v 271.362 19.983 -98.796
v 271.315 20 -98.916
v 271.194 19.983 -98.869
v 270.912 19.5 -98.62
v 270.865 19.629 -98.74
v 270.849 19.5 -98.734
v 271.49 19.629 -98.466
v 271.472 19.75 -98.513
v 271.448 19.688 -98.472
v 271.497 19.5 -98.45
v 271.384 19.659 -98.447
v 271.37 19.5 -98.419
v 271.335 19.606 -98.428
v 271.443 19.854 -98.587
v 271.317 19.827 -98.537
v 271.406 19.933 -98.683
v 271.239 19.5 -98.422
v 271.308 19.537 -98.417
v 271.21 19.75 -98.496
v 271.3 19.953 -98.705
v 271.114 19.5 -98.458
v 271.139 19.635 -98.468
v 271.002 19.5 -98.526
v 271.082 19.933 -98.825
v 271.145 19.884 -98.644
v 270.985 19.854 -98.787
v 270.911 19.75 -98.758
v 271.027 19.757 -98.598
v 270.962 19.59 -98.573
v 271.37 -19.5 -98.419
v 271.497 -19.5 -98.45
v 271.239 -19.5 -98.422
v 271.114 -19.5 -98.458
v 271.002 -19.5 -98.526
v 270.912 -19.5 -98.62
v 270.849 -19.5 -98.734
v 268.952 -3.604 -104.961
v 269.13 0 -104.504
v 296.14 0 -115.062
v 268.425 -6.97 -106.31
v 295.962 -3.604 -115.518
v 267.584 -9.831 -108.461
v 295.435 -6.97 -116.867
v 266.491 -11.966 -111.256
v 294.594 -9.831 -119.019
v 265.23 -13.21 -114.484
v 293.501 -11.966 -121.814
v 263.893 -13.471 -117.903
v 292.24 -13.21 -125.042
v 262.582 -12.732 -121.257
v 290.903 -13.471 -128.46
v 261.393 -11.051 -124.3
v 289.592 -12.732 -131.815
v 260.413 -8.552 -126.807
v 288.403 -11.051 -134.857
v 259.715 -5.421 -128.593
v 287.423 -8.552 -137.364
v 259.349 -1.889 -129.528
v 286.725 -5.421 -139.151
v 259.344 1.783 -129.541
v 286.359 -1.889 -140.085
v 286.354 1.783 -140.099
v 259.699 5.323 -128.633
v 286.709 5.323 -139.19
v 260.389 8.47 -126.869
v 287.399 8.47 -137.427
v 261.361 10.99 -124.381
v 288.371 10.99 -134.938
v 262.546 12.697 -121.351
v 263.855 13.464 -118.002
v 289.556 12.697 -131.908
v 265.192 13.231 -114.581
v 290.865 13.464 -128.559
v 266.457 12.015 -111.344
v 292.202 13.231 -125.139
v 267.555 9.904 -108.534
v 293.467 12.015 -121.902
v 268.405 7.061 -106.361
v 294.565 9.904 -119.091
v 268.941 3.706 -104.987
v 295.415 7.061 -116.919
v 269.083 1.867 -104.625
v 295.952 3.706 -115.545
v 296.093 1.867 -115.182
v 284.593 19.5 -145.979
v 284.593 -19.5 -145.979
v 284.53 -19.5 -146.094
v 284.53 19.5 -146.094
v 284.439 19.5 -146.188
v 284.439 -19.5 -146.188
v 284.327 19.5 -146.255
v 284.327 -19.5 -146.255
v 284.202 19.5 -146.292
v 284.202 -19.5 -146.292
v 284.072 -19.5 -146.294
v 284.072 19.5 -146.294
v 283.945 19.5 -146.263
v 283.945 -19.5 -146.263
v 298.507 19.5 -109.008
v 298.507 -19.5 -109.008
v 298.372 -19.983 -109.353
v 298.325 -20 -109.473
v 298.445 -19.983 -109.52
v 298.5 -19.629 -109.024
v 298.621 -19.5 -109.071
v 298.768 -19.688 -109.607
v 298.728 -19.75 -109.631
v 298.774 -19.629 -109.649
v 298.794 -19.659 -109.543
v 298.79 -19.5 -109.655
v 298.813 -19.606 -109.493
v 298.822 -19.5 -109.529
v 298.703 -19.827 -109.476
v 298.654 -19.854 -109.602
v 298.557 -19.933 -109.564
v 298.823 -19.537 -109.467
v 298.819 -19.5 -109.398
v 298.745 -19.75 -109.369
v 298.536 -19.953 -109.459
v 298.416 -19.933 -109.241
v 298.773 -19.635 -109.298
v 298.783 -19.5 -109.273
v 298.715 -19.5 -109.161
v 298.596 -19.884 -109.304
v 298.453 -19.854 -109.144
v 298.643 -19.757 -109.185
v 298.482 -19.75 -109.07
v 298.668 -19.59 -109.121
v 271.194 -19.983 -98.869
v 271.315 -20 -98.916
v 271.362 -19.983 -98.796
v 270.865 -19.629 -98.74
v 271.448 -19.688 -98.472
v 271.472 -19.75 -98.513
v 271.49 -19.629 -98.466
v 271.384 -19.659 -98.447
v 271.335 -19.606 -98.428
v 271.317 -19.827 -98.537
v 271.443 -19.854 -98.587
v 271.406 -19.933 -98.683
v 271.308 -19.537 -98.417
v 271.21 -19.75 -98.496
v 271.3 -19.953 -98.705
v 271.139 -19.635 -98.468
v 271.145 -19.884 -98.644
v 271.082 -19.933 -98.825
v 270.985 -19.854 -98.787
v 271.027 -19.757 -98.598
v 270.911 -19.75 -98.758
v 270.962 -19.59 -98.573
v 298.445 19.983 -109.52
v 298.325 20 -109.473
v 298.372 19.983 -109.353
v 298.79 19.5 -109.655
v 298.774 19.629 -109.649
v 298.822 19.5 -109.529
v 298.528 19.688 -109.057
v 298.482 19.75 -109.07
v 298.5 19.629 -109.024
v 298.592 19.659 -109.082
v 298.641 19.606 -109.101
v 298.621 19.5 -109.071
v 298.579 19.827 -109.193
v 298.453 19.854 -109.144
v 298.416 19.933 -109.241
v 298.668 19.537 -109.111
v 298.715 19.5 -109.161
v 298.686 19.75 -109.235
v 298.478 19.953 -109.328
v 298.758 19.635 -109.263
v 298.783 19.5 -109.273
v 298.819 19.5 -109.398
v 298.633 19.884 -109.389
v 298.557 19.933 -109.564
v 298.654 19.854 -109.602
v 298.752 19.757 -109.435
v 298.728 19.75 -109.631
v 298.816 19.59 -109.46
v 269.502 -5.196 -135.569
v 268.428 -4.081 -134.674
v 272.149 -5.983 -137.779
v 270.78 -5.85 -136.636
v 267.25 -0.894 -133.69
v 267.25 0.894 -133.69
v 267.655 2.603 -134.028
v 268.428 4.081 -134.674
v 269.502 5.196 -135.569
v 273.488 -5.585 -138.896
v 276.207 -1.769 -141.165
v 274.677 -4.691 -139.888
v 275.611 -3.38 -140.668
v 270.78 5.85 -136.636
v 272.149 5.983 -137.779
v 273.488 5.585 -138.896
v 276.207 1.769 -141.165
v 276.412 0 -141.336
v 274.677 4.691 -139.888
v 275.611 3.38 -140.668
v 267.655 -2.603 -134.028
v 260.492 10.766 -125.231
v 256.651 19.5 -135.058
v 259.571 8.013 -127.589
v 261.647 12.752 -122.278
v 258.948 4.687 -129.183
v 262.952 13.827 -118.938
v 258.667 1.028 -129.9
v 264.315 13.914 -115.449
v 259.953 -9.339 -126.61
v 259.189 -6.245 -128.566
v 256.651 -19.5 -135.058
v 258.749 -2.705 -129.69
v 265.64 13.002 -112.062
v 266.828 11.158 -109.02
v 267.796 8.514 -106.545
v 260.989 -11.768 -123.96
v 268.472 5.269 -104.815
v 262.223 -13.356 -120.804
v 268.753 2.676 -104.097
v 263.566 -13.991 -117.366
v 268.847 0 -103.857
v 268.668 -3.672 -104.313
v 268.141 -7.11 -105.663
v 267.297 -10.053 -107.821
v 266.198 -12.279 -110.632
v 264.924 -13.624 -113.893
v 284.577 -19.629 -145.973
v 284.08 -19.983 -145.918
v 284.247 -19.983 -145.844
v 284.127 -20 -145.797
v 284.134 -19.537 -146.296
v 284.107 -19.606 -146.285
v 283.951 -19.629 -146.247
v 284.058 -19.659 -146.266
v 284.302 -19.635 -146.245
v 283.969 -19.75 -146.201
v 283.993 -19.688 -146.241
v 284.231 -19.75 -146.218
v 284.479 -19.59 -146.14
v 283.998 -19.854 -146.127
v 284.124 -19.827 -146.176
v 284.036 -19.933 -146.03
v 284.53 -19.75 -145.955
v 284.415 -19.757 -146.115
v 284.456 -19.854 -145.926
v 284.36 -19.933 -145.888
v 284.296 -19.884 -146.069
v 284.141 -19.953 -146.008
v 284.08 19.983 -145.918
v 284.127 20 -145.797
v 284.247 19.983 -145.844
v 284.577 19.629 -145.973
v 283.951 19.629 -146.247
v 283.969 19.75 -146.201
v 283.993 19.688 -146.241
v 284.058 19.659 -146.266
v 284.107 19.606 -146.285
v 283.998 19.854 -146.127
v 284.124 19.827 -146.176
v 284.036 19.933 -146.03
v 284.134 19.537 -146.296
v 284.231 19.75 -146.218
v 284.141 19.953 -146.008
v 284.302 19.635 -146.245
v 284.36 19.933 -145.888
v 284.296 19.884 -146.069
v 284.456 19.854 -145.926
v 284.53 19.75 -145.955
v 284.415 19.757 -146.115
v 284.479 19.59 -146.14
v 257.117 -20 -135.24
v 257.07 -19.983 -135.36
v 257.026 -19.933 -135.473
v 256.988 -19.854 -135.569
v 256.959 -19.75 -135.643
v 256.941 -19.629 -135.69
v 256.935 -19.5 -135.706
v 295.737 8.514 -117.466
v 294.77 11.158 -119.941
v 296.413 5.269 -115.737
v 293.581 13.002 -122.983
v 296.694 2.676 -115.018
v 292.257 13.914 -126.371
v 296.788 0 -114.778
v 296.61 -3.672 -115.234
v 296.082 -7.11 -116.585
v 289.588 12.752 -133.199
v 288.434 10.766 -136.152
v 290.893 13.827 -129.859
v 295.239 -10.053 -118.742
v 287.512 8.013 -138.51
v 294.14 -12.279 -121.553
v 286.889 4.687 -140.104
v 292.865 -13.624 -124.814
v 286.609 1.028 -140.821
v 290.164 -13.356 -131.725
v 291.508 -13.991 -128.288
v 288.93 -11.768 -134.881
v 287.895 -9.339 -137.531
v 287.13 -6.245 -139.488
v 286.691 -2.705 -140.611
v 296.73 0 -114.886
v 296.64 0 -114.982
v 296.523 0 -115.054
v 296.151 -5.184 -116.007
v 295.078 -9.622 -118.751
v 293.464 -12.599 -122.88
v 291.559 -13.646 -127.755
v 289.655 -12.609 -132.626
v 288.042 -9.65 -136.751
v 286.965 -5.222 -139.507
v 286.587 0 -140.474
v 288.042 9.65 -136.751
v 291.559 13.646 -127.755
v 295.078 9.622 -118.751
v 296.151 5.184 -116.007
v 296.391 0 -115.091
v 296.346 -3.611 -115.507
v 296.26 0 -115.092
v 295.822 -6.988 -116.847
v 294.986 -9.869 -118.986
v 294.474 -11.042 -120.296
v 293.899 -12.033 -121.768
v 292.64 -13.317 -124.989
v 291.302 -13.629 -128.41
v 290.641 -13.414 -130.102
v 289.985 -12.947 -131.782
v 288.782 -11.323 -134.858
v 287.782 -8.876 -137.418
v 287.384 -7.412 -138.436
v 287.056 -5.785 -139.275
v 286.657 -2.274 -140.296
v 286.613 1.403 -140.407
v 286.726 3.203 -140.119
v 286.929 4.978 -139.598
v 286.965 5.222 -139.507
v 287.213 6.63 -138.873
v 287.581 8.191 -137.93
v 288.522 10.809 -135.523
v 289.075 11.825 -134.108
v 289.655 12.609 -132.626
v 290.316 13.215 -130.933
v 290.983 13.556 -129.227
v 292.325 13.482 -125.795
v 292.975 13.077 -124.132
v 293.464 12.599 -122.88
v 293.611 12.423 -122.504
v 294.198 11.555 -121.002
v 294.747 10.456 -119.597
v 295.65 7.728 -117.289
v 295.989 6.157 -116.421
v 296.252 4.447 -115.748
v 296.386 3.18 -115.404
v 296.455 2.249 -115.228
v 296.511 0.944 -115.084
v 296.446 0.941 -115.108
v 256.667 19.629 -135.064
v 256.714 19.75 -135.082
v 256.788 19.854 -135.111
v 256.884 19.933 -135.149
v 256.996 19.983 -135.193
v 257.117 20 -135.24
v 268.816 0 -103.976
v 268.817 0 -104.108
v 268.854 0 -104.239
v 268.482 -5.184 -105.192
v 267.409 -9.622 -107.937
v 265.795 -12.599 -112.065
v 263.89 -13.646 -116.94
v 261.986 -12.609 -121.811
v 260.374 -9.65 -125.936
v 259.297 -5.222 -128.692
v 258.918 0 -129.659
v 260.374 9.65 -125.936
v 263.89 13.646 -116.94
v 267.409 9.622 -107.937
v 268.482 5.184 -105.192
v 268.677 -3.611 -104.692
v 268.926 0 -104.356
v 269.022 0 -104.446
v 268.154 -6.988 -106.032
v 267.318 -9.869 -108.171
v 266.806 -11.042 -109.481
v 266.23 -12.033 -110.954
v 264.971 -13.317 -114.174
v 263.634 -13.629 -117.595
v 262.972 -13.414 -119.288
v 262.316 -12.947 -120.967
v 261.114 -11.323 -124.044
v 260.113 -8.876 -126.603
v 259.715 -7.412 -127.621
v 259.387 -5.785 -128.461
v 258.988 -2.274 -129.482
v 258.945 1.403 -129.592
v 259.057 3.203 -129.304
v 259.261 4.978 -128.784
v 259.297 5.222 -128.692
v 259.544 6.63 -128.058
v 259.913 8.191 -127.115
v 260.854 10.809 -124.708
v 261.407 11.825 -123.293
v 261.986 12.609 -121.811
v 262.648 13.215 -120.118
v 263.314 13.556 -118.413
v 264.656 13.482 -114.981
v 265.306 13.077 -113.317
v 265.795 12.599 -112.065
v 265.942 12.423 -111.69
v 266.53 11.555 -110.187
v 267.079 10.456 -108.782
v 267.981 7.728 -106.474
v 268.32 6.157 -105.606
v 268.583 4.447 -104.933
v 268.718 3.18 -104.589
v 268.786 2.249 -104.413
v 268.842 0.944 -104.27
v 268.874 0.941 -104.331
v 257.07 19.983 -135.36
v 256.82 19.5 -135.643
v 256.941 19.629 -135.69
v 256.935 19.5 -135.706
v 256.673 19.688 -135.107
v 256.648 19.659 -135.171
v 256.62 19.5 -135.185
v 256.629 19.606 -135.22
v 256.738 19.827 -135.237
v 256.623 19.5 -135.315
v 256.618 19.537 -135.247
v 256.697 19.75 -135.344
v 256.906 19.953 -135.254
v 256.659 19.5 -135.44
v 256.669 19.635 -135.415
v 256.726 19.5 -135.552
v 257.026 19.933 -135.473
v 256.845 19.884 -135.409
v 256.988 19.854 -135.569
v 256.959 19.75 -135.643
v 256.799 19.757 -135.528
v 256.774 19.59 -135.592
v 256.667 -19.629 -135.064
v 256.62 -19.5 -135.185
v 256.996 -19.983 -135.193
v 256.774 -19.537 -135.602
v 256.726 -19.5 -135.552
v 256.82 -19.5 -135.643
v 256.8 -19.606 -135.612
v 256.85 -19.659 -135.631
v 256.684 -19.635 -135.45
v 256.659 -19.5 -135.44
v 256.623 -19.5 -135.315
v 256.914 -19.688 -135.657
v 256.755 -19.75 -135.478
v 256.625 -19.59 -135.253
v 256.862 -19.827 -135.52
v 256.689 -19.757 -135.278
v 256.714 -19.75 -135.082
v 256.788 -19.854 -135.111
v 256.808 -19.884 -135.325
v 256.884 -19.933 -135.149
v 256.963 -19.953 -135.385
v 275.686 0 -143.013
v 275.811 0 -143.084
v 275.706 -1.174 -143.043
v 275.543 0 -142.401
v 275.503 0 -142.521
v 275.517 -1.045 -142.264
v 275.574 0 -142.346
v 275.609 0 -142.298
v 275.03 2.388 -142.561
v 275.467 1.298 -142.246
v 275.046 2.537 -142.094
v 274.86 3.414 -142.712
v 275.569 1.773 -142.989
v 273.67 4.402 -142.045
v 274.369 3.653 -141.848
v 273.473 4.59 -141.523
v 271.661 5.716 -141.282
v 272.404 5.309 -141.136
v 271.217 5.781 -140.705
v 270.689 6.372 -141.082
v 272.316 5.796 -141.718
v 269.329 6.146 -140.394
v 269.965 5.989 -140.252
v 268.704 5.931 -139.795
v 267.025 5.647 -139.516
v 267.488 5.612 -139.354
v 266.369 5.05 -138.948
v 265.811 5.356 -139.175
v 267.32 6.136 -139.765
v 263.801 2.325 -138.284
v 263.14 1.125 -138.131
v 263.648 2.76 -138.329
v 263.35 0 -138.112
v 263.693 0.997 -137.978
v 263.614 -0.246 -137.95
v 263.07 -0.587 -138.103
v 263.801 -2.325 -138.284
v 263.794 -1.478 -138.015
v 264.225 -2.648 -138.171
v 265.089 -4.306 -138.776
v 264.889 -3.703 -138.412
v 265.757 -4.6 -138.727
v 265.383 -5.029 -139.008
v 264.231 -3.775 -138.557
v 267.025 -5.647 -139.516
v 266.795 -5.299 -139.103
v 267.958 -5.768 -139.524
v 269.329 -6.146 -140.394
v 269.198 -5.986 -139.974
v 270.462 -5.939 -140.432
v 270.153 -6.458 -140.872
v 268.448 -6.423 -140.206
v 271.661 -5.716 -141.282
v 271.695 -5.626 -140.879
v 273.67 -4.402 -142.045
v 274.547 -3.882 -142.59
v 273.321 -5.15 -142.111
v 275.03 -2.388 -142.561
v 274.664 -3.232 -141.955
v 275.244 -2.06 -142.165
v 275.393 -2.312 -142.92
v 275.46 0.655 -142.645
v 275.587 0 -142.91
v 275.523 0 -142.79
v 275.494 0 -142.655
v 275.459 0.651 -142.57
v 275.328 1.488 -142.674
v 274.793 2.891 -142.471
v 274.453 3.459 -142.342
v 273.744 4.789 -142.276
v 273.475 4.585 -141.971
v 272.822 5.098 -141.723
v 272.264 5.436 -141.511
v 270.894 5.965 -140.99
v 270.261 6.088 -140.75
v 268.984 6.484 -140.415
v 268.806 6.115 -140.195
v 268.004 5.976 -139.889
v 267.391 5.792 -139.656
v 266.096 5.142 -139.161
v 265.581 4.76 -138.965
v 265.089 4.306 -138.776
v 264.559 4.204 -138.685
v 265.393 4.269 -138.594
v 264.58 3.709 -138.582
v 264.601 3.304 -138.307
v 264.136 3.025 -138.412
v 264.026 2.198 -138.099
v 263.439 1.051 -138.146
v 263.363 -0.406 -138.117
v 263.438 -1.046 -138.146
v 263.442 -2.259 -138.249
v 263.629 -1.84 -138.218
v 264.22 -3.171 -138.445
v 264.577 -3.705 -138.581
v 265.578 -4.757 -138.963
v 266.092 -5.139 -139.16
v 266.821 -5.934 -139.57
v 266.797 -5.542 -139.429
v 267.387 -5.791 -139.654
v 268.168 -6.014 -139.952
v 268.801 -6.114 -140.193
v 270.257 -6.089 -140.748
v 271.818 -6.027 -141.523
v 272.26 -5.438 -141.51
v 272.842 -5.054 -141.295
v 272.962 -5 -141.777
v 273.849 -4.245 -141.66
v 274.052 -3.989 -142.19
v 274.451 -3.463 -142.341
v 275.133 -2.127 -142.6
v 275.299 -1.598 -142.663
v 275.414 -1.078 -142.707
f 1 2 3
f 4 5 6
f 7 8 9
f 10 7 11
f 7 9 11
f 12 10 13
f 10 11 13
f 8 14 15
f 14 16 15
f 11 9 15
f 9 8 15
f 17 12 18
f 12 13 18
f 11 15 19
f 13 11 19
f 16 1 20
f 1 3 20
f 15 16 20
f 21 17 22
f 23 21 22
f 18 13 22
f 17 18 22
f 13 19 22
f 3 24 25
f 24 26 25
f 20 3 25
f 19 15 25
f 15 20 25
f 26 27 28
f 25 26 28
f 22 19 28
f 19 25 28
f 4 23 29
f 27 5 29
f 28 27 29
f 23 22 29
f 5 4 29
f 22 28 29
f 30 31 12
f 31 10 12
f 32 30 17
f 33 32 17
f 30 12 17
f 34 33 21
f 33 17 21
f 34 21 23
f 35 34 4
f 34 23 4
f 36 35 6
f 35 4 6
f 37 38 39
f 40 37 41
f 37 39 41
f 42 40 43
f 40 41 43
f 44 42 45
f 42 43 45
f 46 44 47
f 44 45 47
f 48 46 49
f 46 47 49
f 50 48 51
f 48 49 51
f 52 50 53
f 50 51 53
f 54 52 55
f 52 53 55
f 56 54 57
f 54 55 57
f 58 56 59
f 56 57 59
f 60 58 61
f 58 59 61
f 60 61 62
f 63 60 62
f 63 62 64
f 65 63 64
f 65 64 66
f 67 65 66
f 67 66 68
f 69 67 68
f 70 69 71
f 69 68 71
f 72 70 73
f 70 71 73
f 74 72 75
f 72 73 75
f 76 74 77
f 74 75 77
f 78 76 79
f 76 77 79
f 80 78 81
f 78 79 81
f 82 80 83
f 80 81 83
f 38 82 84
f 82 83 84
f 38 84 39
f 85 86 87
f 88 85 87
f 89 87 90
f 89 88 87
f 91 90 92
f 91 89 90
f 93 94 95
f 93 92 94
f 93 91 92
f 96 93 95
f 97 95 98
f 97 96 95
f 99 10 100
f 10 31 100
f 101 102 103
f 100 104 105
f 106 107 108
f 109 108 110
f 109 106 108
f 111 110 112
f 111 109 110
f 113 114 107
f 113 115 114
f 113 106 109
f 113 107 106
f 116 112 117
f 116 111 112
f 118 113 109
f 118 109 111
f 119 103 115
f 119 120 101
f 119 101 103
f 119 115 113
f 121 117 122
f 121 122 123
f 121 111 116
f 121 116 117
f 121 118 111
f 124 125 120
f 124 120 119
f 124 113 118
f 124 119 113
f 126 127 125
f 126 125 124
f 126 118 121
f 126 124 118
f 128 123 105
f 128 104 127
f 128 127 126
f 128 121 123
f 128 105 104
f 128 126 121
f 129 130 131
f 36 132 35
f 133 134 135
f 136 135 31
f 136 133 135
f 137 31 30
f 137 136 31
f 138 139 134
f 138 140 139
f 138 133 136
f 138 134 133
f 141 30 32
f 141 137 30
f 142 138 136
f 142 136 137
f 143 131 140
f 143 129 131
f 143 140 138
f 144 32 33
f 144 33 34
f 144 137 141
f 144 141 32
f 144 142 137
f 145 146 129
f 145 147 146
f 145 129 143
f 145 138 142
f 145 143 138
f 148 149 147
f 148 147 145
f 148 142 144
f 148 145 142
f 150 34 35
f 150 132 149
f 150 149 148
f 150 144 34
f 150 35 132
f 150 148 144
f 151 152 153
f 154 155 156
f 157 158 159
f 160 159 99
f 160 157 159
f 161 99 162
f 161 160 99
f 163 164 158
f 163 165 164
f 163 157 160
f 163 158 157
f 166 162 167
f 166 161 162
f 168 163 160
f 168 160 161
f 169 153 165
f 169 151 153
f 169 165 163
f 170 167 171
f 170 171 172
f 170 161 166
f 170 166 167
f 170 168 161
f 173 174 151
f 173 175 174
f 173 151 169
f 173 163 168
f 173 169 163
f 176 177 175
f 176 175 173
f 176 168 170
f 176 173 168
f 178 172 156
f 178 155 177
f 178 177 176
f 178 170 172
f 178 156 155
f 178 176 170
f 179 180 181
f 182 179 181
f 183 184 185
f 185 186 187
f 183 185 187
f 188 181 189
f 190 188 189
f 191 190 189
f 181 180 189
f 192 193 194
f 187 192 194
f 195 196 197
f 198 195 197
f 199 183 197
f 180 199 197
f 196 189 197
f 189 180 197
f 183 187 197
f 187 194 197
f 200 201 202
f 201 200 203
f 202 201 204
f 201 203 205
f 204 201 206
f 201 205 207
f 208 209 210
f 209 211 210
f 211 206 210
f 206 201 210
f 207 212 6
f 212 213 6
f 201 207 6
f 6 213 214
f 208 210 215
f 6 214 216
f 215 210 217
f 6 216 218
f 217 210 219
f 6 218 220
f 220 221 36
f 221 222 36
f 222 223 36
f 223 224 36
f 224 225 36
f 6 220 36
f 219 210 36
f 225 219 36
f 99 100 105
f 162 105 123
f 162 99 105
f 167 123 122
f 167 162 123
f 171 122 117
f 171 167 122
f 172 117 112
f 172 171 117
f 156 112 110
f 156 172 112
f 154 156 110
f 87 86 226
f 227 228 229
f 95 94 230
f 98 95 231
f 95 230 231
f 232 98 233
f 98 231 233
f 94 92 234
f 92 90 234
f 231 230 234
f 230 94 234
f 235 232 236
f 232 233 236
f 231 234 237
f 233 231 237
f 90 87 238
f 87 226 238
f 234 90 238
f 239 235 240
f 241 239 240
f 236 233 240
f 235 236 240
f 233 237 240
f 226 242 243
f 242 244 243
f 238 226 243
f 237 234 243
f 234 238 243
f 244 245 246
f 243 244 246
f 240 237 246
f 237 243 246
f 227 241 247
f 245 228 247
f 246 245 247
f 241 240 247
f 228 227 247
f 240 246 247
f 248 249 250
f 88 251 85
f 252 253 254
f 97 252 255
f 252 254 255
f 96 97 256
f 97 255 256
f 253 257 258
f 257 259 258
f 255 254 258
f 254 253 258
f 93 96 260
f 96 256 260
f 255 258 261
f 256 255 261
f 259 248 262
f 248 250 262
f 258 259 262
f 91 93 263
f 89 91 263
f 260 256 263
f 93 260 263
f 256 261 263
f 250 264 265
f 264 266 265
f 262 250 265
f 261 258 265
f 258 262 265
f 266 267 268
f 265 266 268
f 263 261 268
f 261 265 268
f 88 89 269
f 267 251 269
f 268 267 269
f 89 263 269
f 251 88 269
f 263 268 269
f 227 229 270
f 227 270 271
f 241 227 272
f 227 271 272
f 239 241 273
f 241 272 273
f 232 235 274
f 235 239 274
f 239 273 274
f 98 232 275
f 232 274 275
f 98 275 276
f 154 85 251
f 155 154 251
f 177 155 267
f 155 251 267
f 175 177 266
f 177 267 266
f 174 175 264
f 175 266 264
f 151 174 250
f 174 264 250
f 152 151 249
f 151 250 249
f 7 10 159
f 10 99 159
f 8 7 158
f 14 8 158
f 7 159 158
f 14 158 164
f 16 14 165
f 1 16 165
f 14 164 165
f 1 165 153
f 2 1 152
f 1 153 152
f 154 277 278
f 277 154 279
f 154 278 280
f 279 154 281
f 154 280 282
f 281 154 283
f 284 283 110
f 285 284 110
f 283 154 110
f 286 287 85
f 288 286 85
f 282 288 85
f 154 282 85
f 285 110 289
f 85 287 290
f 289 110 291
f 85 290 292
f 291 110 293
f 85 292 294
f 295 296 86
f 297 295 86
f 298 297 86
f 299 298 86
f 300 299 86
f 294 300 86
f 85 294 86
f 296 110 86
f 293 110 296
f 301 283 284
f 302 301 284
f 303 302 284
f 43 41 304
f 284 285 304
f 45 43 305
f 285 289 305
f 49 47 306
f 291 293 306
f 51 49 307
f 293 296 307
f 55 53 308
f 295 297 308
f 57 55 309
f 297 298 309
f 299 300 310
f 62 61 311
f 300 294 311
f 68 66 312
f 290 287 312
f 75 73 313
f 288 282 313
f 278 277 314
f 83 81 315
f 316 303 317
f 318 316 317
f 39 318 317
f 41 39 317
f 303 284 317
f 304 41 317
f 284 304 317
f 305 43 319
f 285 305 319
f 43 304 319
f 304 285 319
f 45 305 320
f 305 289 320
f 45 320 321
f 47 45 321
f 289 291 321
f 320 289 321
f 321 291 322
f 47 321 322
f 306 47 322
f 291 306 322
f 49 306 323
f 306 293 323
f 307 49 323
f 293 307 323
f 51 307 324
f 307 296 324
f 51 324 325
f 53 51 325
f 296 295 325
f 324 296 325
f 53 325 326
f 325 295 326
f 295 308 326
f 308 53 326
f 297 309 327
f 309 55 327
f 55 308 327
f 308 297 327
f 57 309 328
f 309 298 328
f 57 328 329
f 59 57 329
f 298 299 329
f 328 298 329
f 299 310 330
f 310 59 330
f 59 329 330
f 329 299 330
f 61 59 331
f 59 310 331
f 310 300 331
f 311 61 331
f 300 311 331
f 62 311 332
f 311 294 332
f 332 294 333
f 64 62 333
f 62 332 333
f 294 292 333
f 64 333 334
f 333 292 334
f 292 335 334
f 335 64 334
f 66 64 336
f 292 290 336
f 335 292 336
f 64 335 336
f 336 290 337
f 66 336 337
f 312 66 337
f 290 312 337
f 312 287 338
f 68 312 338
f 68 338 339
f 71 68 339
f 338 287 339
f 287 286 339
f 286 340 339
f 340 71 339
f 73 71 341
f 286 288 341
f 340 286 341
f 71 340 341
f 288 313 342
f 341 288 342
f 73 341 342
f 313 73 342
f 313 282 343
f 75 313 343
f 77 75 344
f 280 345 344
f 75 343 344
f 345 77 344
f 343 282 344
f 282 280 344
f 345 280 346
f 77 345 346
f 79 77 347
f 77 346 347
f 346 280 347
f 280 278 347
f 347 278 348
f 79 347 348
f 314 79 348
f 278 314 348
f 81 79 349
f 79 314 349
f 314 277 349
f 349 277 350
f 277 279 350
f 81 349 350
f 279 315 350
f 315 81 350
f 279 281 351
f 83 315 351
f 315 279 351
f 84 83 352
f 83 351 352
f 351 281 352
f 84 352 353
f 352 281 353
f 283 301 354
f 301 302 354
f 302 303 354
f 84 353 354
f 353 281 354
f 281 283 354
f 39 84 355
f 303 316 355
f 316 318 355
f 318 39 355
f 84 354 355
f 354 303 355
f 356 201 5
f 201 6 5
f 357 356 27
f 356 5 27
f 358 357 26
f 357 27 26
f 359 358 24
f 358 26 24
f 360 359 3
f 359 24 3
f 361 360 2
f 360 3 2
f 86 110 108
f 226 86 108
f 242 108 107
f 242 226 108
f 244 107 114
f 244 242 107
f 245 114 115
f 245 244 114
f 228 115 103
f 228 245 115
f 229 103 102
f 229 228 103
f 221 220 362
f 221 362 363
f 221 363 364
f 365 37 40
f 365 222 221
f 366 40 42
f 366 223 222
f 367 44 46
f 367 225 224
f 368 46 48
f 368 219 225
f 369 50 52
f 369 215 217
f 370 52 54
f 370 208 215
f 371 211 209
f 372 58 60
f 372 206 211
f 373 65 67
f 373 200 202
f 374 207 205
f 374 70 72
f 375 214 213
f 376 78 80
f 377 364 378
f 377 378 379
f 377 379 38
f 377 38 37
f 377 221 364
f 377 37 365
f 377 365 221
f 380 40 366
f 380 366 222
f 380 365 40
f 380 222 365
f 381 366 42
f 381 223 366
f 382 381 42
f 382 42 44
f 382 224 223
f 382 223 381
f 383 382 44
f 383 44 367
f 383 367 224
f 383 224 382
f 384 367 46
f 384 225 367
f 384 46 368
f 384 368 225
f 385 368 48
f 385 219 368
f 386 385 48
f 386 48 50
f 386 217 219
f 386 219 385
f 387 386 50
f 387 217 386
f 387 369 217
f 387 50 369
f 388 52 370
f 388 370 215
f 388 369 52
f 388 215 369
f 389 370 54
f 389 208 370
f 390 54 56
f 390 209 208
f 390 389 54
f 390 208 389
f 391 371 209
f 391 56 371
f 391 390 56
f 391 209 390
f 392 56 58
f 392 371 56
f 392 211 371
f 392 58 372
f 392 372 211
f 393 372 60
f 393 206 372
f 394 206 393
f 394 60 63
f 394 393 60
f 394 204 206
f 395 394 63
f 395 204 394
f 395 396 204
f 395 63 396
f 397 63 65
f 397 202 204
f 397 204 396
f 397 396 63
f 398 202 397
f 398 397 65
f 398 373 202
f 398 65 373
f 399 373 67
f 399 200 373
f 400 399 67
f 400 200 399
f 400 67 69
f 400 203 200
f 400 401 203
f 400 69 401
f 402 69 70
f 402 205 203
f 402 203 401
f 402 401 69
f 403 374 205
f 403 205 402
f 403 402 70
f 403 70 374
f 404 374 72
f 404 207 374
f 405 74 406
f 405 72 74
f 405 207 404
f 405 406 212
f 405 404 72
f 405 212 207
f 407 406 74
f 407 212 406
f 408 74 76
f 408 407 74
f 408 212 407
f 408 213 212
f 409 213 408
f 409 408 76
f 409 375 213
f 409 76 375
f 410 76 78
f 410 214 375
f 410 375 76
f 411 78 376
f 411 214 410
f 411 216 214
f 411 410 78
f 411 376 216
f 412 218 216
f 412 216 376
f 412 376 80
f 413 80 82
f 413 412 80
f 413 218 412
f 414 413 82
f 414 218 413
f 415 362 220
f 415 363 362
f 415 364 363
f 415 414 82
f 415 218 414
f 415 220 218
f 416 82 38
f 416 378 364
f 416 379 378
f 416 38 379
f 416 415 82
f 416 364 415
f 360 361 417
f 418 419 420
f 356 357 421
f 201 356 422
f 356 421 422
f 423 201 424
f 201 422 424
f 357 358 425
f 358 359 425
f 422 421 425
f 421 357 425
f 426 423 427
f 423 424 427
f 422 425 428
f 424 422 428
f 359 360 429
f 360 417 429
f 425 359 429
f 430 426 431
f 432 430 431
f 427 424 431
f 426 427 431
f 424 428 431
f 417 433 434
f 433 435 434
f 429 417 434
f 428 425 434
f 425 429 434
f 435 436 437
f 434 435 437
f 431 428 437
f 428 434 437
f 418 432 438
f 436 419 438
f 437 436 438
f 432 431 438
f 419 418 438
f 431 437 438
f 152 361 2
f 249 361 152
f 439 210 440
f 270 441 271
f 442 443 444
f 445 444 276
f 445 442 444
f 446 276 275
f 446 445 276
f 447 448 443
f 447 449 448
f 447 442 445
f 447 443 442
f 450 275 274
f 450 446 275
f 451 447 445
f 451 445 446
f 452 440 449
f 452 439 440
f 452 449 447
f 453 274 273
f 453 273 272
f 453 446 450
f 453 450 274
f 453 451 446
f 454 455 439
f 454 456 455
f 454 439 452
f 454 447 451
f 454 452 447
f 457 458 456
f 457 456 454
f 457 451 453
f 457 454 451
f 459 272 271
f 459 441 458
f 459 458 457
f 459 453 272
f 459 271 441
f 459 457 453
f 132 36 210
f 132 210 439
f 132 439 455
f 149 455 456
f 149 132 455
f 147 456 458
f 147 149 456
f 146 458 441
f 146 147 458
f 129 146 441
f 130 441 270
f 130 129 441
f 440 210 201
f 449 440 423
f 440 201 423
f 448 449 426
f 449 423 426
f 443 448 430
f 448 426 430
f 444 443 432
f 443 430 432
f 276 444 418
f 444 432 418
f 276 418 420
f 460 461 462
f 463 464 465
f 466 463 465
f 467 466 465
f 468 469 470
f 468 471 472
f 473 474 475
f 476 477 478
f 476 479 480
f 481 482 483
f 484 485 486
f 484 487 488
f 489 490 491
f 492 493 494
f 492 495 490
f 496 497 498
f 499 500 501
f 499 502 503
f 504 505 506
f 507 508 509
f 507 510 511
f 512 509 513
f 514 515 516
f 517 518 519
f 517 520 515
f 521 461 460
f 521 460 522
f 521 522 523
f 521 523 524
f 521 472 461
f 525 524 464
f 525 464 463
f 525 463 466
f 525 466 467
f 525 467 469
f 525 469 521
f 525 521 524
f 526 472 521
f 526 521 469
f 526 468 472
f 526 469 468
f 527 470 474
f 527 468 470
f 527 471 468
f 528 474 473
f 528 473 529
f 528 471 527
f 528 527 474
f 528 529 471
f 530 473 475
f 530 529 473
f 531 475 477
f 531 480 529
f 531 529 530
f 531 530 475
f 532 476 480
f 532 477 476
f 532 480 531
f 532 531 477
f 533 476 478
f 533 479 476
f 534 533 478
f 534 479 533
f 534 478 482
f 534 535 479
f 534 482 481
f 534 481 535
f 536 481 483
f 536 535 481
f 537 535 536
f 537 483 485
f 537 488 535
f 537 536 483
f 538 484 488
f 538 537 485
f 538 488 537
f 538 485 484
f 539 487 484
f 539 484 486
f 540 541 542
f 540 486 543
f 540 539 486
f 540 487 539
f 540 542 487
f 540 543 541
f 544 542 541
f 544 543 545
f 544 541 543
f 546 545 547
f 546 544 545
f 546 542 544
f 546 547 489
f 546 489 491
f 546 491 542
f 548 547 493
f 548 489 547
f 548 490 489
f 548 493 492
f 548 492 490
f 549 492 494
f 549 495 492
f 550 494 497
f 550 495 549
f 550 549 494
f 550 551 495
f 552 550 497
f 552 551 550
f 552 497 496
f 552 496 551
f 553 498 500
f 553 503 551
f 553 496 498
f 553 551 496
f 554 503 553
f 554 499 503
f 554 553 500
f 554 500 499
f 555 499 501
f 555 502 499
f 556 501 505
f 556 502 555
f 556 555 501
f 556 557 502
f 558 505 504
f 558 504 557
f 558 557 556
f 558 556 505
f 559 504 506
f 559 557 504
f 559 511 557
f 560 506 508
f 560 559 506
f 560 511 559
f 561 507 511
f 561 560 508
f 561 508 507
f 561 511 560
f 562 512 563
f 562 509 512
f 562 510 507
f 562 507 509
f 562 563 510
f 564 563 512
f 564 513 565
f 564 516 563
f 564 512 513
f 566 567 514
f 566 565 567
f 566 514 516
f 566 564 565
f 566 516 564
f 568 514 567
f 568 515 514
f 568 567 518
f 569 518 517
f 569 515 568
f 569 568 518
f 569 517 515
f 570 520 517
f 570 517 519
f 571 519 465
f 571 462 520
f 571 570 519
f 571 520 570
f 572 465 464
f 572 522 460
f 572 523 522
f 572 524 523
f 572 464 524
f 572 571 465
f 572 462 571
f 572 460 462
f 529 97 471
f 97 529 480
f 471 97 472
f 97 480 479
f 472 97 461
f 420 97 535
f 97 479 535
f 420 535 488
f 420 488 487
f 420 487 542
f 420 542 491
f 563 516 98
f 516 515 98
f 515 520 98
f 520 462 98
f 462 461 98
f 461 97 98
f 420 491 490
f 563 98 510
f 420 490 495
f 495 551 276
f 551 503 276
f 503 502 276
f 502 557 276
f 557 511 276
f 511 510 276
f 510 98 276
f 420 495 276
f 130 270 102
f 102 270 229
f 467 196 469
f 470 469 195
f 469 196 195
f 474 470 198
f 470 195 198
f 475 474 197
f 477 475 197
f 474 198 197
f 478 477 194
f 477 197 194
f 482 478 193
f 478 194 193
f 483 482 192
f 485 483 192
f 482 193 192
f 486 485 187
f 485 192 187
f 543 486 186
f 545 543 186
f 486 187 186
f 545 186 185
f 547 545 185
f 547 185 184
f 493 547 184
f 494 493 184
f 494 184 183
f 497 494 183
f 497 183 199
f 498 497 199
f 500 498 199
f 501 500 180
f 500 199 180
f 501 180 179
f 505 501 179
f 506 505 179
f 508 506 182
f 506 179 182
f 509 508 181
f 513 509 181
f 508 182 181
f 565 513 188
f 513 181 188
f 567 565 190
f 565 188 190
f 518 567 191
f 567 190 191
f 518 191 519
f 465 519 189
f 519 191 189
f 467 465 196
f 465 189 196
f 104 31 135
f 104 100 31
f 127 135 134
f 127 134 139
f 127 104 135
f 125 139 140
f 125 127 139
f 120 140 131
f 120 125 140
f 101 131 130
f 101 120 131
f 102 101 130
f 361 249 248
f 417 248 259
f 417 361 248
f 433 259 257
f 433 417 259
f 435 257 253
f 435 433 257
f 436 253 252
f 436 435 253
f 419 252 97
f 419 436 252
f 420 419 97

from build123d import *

# Parameters (mm, degrees)
BOSS_EXTRUDE1_DEPTH      = 20
BOSS_EXTRUDE1_DEPTH_BACK = 20
CUT_SWEEP1_PROFILE_R     = 13.5
CUT_SWEEP2_PROFILE_R     = 6
FILLET1_R                = 0.5


with BuildPart() as part:
    # Sketch20 → Boss-Extrude1 (new, two sides: drawn at the far end of the back side and taken through both)
    with BuildSketch(Plane(origin=(0, 0, 0), x_dir=(1, 0, 0), z_dir=(0, 1, 0)).offset(-BOSS_EXTRUDE1_DEPTH_BACK)):
        Polygon((271.030924973, 98.268326166), (298.972363284, 109.189682542), (284.410554783, 146.444933624), (256.469116472, 135.523577248), align=None)
    extrude(amount=BOSS_EXTRUDE1_DEPTH + BOSS_EXTRUDE1_DEPTH_BACK)

    # Cut-Sweep1: sweep along a path in Sketch6
    with BuildLine(Plane(origin=(0, 0, 0), x_dir=(1, 0, 0), z_dir=(0, 1, 0))) as cut_sweep1_path:
        Line((27.911860583, 24.714849031), (544.640102873, 226.686315947))
    # Cut-Sweep1 profile (on start of the path) → Cut-Sweep1 (sweep, cut)
    with BuildSketch(Plane(origin=(27.911860583, 0, -24.714849031), x_dir=(0.3640452125264868, 0, 0.931381277048527), z_dir=(0.931381277048527, 0, -0.3640452125264868))):
        Circle(CUT_SWEEP1_PROFILE_R)
    sweep(path=cut_sweep1_path.line, mode=Mode.SUBTRACT)

    # Cut-Sweep2: sweep along a path in Sketch19
    with BuildLine(Plane(origin=(0, 0, 0), x_dir=(1, 0, 0), z_dir=(0, 1, 0))) as cut_sweep2_path:
        Line((128.459886798, 309.266363493), (271.805005174, 137.491575647))
    # Cut-Sweep2 profile (on start of the path) → Cut-Sweep2 (sweep, cut)
    with BuildSketch(Plane(origin=(128.459886798, 0, -309.266363493), x_dir=(0.767782639292157, 0, -0.6407104016648784), z_dir=(0.6407104016648784, 0, 0.767782639292157))):
        Circle(CUT_SWEEP2_PROFILE_R)
    sweep(path=cut_sweep2_path.line, mode=Mode.SUBTRACT)

    # Fillet1
    fillet1_edges = [part.edges().sort_by_distance(p)[0] for p in [
        (291.691459034, 20, -127.817308083),
        (263.750020722, -20, -116.895951707),
        (270.439835627, 20, -140.984255436),
        (263.750020722, 20, -116.895951707),
        (285.001644128, 20, -103.729004354),
        (285.001644128, -20, -103.729004354),
        (286.776848665, 0, -140.390955323),
        (258.835410353, 0, -129.469598947),
        (263.37880602, -1.3026e-05, -138.224339505),
        (291.691459034, -20, -127.817308083),
        (298.972363284, 0, -109.189682542),
        (271.030924973, 0, -98.268326166),
        (256.469116472, 0, -135.523577248),
        (284.410554783, 0, -146.444933624),
        (270.439835627, -20, -140.984255436),
    ]]
    fillet(fillet1_edges, radius=FILLET1_R)


solid = part.part
